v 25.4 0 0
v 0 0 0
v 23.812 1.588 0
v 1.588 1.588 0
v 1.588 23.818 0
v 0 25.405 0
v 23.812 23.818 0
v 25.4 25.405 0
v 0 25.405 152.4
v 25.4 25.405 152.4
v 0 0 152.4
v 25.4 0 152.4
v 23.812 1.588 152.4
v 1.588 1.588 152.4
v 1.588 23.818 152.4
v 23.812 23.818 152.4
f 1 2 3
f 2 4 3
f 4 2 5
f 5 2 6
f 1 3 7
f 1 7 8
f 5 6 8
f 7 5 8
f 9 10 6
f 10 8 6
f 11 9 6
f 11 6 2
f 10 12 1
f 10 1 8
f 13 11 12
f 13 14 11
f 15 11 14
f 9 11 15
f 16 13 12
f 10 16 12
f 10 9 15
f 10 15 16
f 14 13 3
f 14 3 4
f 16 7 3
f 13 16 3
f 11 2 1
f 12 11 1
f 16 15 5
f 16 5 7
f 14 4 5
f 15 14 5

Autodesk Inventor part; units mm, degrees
ref_plane "YZ Plane" through (0, 0, 0) normal (1, 0, 0) x (0, 1, 0)
ref_plane "XZ Plane" through (0, 0, 0) normal (0, 1, 0) x (-1, 0, 0)
ref_plane "XY Plane" through (0, 0, 0) normal (0, 0, 1) x (1, 0, 0)
sketch "Sketch1" plane through (0, 0, 0) normal (0, 0, 1) x (1, 0, 0)
  line L0 (0, 0) -> (25.4, 0)
  line L1 (25.4, 0) -> (25.4, 25.4053)
  line L2 (25.4, 25.4053) -> (0, 25.4053)
  line L3 (0, 25.4053) -> (0, 0)
  line L4 (1.5875, 22.2862) -> (1.5875, 23.8178) construction
  line L5 (1.5875, 23.8178) -> (23.8125, 23.8178)
  line L6 (23.8125, 23.8178) -> (23.8125, 1.5875)
  line L7 (23.8125, 1.5875) -> (1.5875, 1.5875)
  line L8 (1.5875, 1.5875) -> (1.5875, 23.8178)
  dimension "d0" = 25.4
  dimension "d4" = 22.225
extrude "Extrusion1" add sketch "Sketch1" along normal blind 152.4
properties part number "Hook 2nd 1x1"
